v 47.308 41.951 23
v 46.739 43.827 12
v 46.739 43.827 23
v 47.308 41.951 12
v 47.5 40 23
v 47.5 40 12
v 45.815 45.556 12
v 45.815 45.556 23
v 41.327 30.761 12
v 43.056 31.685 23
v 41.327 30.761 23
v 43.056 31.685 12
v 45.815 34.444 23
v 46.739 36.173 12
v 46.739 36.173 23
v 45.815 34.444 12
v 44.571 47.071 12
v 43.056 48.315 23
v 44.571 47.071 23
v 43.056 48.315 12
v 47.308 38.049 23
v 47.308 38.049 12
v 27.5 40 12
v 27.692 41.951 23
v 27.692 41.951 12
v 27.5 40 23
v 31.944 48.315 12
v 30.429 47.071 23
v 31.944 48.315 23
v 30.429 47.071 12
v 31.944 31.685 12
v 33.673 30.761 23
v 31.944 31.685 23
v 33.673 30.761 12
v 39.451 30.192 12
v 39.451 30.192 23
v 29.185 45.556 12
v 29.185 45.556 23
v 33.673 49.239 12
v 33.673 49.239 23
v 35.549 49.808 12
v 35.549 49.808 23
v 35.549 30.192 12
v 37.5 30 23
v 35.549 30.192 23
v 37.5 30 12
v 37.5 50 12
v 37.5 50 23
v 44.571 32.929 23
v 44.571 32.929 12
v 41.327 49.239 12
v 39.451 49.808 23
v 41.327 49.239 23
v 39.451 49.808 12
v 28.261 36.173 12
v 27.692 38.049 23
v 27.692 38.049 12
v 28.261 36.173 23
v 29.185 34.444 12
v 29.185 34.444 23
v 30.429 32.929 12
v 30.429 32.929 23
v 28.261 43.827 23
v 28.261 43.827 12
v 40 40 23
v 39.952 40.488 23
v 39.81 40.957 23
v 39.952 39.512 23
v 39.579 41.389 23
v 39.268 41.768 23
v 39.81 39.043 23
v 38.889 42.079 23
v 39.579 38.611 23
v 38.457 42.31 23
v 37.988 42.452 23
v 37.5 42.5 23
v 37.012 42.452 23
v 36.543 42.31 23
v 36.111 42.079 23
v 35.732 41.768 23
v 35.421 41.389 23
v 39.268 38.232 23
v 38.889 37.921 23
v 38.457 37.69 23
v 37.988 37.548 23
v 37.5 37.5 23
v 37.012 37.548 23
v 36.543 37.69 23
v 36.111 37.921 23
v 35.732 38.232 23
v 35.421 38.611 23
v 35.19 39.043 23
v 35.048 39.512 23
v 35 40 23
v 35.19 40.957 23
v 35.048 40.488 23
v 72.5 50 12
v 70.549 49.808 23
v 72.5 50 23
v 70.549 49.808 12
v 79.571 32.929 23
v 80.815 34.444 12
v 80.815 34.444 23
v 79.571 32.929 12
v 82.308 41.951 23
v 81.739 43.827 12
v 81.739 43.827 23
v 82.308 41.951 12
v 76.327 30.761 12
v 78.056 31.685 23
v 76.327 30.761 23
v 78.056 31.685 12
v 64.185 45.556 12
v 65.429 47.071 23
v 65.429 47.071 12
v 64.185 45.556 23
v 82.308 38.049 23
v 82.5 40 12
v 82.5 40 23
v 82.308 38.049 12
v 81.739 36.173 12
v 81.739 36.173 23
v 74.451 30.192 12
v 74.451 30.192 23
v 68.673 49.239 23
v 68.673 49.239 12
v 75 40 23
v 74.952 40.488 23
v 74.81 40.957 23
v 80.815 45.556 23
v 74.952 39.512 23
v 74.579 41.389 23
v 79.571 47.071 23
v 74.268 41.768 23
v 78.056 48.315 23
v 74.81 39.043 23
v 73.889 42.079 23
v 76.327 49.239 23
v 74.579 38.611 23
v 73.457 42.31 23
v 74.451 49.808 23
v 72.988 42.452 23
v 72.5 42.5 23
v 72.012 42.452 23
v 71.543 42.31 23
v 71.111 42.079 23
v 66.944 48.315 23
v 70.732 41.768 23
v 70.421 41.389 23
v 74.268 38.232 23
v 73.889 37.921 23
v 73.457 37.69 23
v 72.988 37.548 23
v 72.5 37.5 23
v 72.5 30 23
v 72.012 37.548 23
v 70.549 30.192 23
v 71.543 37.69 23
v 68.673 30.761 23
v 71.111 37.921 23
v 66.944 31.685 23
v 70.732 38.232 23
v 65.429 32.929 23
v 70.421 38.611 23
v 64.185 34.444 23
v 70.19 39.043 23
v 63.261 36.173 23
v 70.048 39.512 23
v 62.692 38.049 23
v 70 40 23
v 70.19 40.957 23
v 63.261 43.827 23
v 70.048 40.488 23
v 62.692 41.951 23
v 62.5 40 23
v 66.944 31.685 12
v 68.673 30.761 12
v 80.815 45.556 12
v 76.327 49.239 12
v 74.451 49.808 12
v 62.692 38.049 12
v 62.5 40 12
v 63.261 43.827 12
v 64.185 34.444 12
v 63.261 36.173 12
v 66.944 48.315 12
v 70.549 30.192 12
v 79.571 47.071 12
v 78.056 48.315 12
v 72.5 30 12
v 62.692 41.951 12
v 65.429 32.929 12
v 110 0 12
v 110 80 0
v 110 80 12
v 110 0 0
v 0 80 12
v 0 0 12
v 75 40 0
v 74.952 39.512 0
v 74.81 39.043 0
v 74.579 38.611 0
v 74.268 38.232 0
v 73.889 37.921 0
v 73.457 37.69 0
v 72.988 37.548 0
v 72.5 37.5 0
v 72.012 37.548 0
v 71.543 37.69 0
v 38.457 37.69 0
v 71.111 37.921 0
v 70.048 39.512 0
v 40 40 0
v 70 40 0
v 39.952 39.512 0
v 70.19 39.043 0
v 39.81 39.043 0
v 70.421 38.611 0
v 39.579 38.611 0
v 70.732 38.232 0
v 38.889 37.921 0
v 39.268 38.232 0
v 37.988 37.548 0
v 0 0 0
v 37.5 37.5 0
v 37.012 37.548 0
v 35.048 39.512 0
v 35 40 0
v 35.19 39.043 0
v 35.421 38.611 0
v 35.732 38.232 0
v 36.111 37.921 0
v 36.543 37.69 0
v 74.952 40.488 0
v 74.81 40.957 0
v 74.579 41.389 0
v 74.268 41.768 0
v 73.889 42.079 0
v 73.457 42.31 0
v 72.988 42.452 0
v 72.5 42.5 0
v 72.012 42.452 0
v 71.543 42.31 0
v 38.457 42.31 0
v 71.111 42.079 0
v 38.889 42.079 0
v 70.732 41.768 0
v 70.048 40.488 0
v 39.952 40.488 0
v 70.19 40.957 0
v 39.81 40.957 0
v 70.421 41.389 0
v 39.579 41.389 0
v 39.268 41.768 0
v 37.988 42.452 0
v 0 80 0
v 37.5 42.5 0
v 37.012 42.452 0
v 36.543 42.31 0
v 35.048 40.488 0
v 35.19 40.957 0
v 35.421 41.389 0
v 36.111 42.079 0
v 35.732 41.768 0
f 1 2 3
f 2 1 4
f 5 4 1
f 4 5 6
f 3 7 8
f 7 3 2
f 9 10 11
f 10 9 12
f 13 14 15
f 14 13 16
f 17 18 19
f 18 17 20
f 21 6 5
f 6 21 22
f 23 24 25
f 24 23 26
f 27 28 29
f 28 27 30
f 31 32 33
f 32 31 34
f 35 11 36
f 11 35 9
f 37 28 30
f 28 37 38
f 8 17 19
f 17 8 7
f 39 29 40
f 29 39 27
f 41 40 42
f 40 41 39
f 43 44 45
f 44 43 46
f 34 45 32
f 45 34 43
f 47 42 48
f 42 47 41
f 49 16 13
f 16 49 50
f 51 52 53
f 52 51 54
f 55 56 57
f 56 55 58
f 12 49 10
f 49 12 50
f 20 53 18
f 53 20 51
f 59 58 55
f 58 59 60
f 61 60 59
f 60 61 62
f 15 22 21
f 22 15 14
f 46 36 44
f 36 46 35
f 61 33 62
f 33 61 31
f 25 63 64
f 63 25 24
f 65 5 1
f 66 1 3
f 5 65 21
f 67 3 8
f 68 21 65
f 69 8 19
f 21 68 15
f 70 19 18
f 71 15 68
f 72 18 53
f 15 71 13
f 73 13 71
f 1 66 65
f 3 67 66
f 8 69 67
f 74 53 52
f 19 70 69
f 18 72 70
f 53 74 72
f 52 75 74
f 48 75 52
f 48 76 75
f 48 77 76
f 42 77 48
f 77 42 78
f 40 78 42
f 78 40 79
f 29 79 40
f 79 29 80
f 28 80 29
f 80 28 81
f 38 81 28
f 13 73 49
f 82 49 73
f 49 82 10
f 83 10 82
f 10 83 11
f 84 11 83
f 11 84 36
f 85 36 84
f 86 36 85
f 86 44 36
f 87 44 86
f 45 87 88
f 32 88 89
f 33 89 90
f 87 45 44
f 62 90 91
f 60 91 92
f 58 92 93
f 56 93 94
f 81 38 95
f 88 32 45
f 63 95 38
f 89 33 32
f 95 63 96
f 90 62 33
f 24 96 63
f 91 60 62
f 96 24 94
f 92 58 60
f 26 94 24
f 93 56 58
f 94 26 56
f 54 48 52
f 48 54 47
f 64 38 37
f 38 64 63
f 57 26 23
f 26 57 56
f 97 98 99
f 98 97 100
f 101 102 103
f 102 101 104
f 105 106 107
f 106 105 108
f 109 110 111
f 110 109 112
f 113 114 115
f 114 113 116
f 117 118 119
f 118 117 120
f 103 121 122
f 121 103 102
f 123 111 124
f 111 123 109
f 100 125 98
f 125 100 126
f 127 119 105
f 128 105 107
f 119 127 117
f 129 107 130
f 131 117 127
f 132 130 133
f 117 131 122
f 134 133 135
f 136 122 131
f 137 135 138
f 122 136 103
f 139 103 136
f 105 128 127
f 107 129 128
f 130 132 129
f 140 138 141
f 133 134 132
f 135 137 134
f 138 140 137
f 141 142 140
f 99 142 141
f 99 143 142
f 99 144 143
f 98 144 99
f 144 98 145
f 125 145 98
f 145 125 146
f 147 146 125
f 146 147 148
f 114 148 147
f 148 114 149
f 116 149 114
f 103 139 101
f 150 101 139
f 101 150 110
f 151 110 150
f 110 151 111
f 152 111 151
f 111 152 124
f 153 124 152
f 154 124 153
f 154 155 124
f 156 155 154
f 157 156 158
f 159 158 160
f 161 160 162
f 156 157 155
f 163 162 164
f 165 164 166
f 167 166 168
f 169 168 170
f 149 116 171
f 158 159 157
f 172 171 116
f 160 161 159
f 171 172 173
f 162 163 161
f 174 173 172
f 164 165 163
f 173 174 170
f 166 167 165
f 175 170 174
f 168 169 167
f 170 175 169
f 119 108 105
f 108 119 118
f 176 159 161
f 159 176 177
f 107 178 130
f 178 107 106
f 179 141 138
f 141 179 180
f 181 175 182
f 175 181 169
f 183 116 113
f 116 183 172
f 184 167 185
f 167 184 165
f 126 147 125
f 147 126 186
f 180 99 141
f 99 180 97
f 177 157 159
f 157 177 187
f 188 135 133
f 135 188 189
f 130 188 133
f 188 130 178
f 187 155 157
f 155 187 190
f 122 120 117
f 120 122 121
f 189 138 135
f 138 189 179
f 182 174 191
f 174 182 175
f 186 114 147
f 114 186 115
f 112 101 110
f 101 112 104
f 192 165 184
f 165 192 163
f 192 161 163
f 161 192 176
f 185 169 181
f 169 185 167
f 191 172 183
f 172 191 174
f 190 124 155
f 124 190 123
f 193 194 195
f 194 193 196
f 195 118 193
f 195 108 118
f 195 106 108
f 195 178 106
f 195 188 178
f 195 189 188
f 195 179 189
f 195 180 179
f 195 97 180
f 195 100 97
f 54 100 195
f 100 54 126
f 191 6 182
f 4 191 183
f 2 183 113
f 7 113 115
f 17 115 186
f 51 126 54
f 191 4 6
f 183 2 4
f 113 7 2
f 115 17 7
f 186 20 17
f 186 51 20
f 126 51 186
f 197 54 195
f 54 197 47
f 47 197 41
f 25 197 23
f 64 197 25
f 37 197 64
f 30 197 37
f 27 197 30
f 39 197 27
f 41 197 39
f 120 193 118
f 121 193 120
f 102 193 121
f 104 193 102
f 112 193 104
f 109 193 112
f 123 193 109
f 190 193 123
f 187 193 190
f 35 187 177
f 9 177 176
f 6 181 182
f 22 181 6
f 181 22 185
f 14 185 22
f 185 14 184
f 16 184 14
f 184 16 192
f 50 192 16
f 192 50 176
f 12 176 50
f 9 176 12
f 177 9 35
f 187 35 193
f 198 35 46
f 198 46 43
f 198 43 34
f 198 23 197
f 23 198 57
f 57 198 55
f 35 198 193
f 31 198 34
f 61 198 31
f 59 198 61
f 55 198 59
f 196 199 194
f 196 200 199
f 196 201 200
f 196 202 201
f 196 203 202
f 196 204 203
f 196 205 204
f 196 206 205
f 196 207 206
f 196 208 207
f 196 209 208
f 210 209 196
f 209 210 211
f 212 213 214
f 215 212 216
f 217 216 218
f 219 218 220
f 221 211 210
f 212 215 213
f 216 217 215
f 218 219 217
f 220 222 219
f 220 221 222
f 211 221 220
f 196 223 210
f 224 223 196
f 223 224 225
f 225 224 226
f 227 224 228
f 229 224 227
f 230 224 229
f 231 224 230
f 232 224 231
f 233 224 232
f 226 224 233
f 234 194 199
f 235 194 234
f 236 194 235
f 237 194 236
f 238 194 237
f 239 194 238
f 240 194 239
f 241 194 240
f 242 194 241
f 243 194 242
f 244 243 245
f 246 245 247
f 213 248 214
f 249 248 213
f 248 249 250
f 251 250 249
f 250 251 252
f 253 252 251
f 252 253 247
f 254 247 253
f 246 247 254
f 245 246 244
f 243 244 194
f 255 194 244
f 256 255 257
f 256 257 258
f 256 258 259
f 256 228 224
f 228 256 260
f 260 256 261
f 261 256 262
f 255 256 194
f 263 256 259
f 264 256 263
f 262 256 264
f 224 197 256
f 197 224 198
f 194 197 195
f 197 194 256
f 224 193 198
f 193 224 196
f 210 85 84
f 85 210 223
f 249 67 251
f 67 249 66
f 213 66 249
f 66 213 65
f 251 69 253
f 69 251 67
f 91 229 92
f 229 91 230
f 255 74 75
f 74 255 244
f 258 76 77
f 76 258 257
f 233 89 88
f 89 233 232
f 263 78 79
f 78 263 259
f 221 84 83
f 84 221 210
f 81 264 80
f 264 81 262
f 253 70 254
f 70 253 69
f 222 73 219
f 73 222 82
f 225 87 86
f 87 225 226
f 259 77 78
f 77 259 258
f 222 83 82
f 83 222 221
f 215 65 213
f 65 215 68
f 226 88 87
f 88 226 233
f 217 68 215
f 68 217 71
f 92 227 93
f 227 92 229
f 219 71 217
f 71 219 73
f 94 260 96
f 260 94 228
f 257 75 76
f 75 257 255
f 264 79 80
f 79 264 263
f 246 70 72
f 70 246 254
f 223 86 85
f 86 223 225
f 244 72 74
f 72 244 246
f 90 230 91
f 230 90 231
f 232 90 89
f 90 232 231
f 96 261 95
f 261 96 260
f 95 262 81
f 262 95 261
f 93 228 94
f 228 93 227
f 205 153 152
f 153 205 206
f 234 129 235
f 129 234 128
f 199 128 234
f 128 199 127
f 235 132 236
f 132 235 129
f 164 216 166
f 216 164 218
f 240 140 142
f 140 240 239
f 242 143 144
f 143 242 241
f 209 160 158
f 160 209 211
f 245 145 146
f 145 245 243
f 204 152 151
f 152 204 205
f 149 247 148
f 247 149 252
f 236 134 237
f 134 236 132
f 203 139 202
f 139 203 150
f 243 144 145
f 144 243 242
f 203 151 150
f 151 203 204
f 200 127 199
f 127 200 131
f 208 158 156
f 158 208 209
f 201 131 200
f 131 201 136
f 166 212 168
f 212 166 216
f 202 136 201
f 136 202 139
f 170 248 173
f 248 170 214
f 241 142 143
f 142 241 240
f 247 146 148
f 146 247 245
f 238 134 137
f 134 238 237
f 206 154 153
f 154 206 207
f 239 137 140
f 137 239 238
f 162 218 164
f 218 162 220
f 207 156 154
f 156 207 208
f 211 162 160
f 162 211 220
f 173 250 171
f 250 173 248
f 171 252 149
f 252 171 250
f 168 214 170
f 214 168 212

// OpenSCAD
$fn = 32;

// ----------------------------------------------------------------------
// Drill jig: two_boss jig
// ----------------------------------------------------------------------

// --- parameters (mm) ---
plate_l = 110;            // plate length, X
plate_w = 80;             // plate width, Y
plate_t = 12;             // plate thickness
boss_d = 20;              // guide boss diameter
boss_h = 12;              // boss height above the plate
guide_d = 5;              // guide hole diameter
boss_pitch = 35;          // boss pitch

n_boss = 2;  // guide bosses
boss_x0 = (plate_l - (n_boss - 1) * boss_pitch) / 2;  // first boss X
boss_top = plate_t - 1 + boss_h;  // boss crown height
total_h = boss_top;  // overall height

difference() {
  union() {
  cube([plate_l, plate_w, plate_t]);
  for (i = [0 : n_boss - 1])
    translate([boss_x0 + i * boss_pitch, plate_w / 2, plate_t - 1])
      cylinder(h = boss_h, d = boss_d);
  }
  for (i = [0 : n_boss - 1])
    translate([boss_x0 + i * boss_pitch, plate_w / 2, -1])
      cylinder(h = plate_t + boss_h, d = guide_d);
}
